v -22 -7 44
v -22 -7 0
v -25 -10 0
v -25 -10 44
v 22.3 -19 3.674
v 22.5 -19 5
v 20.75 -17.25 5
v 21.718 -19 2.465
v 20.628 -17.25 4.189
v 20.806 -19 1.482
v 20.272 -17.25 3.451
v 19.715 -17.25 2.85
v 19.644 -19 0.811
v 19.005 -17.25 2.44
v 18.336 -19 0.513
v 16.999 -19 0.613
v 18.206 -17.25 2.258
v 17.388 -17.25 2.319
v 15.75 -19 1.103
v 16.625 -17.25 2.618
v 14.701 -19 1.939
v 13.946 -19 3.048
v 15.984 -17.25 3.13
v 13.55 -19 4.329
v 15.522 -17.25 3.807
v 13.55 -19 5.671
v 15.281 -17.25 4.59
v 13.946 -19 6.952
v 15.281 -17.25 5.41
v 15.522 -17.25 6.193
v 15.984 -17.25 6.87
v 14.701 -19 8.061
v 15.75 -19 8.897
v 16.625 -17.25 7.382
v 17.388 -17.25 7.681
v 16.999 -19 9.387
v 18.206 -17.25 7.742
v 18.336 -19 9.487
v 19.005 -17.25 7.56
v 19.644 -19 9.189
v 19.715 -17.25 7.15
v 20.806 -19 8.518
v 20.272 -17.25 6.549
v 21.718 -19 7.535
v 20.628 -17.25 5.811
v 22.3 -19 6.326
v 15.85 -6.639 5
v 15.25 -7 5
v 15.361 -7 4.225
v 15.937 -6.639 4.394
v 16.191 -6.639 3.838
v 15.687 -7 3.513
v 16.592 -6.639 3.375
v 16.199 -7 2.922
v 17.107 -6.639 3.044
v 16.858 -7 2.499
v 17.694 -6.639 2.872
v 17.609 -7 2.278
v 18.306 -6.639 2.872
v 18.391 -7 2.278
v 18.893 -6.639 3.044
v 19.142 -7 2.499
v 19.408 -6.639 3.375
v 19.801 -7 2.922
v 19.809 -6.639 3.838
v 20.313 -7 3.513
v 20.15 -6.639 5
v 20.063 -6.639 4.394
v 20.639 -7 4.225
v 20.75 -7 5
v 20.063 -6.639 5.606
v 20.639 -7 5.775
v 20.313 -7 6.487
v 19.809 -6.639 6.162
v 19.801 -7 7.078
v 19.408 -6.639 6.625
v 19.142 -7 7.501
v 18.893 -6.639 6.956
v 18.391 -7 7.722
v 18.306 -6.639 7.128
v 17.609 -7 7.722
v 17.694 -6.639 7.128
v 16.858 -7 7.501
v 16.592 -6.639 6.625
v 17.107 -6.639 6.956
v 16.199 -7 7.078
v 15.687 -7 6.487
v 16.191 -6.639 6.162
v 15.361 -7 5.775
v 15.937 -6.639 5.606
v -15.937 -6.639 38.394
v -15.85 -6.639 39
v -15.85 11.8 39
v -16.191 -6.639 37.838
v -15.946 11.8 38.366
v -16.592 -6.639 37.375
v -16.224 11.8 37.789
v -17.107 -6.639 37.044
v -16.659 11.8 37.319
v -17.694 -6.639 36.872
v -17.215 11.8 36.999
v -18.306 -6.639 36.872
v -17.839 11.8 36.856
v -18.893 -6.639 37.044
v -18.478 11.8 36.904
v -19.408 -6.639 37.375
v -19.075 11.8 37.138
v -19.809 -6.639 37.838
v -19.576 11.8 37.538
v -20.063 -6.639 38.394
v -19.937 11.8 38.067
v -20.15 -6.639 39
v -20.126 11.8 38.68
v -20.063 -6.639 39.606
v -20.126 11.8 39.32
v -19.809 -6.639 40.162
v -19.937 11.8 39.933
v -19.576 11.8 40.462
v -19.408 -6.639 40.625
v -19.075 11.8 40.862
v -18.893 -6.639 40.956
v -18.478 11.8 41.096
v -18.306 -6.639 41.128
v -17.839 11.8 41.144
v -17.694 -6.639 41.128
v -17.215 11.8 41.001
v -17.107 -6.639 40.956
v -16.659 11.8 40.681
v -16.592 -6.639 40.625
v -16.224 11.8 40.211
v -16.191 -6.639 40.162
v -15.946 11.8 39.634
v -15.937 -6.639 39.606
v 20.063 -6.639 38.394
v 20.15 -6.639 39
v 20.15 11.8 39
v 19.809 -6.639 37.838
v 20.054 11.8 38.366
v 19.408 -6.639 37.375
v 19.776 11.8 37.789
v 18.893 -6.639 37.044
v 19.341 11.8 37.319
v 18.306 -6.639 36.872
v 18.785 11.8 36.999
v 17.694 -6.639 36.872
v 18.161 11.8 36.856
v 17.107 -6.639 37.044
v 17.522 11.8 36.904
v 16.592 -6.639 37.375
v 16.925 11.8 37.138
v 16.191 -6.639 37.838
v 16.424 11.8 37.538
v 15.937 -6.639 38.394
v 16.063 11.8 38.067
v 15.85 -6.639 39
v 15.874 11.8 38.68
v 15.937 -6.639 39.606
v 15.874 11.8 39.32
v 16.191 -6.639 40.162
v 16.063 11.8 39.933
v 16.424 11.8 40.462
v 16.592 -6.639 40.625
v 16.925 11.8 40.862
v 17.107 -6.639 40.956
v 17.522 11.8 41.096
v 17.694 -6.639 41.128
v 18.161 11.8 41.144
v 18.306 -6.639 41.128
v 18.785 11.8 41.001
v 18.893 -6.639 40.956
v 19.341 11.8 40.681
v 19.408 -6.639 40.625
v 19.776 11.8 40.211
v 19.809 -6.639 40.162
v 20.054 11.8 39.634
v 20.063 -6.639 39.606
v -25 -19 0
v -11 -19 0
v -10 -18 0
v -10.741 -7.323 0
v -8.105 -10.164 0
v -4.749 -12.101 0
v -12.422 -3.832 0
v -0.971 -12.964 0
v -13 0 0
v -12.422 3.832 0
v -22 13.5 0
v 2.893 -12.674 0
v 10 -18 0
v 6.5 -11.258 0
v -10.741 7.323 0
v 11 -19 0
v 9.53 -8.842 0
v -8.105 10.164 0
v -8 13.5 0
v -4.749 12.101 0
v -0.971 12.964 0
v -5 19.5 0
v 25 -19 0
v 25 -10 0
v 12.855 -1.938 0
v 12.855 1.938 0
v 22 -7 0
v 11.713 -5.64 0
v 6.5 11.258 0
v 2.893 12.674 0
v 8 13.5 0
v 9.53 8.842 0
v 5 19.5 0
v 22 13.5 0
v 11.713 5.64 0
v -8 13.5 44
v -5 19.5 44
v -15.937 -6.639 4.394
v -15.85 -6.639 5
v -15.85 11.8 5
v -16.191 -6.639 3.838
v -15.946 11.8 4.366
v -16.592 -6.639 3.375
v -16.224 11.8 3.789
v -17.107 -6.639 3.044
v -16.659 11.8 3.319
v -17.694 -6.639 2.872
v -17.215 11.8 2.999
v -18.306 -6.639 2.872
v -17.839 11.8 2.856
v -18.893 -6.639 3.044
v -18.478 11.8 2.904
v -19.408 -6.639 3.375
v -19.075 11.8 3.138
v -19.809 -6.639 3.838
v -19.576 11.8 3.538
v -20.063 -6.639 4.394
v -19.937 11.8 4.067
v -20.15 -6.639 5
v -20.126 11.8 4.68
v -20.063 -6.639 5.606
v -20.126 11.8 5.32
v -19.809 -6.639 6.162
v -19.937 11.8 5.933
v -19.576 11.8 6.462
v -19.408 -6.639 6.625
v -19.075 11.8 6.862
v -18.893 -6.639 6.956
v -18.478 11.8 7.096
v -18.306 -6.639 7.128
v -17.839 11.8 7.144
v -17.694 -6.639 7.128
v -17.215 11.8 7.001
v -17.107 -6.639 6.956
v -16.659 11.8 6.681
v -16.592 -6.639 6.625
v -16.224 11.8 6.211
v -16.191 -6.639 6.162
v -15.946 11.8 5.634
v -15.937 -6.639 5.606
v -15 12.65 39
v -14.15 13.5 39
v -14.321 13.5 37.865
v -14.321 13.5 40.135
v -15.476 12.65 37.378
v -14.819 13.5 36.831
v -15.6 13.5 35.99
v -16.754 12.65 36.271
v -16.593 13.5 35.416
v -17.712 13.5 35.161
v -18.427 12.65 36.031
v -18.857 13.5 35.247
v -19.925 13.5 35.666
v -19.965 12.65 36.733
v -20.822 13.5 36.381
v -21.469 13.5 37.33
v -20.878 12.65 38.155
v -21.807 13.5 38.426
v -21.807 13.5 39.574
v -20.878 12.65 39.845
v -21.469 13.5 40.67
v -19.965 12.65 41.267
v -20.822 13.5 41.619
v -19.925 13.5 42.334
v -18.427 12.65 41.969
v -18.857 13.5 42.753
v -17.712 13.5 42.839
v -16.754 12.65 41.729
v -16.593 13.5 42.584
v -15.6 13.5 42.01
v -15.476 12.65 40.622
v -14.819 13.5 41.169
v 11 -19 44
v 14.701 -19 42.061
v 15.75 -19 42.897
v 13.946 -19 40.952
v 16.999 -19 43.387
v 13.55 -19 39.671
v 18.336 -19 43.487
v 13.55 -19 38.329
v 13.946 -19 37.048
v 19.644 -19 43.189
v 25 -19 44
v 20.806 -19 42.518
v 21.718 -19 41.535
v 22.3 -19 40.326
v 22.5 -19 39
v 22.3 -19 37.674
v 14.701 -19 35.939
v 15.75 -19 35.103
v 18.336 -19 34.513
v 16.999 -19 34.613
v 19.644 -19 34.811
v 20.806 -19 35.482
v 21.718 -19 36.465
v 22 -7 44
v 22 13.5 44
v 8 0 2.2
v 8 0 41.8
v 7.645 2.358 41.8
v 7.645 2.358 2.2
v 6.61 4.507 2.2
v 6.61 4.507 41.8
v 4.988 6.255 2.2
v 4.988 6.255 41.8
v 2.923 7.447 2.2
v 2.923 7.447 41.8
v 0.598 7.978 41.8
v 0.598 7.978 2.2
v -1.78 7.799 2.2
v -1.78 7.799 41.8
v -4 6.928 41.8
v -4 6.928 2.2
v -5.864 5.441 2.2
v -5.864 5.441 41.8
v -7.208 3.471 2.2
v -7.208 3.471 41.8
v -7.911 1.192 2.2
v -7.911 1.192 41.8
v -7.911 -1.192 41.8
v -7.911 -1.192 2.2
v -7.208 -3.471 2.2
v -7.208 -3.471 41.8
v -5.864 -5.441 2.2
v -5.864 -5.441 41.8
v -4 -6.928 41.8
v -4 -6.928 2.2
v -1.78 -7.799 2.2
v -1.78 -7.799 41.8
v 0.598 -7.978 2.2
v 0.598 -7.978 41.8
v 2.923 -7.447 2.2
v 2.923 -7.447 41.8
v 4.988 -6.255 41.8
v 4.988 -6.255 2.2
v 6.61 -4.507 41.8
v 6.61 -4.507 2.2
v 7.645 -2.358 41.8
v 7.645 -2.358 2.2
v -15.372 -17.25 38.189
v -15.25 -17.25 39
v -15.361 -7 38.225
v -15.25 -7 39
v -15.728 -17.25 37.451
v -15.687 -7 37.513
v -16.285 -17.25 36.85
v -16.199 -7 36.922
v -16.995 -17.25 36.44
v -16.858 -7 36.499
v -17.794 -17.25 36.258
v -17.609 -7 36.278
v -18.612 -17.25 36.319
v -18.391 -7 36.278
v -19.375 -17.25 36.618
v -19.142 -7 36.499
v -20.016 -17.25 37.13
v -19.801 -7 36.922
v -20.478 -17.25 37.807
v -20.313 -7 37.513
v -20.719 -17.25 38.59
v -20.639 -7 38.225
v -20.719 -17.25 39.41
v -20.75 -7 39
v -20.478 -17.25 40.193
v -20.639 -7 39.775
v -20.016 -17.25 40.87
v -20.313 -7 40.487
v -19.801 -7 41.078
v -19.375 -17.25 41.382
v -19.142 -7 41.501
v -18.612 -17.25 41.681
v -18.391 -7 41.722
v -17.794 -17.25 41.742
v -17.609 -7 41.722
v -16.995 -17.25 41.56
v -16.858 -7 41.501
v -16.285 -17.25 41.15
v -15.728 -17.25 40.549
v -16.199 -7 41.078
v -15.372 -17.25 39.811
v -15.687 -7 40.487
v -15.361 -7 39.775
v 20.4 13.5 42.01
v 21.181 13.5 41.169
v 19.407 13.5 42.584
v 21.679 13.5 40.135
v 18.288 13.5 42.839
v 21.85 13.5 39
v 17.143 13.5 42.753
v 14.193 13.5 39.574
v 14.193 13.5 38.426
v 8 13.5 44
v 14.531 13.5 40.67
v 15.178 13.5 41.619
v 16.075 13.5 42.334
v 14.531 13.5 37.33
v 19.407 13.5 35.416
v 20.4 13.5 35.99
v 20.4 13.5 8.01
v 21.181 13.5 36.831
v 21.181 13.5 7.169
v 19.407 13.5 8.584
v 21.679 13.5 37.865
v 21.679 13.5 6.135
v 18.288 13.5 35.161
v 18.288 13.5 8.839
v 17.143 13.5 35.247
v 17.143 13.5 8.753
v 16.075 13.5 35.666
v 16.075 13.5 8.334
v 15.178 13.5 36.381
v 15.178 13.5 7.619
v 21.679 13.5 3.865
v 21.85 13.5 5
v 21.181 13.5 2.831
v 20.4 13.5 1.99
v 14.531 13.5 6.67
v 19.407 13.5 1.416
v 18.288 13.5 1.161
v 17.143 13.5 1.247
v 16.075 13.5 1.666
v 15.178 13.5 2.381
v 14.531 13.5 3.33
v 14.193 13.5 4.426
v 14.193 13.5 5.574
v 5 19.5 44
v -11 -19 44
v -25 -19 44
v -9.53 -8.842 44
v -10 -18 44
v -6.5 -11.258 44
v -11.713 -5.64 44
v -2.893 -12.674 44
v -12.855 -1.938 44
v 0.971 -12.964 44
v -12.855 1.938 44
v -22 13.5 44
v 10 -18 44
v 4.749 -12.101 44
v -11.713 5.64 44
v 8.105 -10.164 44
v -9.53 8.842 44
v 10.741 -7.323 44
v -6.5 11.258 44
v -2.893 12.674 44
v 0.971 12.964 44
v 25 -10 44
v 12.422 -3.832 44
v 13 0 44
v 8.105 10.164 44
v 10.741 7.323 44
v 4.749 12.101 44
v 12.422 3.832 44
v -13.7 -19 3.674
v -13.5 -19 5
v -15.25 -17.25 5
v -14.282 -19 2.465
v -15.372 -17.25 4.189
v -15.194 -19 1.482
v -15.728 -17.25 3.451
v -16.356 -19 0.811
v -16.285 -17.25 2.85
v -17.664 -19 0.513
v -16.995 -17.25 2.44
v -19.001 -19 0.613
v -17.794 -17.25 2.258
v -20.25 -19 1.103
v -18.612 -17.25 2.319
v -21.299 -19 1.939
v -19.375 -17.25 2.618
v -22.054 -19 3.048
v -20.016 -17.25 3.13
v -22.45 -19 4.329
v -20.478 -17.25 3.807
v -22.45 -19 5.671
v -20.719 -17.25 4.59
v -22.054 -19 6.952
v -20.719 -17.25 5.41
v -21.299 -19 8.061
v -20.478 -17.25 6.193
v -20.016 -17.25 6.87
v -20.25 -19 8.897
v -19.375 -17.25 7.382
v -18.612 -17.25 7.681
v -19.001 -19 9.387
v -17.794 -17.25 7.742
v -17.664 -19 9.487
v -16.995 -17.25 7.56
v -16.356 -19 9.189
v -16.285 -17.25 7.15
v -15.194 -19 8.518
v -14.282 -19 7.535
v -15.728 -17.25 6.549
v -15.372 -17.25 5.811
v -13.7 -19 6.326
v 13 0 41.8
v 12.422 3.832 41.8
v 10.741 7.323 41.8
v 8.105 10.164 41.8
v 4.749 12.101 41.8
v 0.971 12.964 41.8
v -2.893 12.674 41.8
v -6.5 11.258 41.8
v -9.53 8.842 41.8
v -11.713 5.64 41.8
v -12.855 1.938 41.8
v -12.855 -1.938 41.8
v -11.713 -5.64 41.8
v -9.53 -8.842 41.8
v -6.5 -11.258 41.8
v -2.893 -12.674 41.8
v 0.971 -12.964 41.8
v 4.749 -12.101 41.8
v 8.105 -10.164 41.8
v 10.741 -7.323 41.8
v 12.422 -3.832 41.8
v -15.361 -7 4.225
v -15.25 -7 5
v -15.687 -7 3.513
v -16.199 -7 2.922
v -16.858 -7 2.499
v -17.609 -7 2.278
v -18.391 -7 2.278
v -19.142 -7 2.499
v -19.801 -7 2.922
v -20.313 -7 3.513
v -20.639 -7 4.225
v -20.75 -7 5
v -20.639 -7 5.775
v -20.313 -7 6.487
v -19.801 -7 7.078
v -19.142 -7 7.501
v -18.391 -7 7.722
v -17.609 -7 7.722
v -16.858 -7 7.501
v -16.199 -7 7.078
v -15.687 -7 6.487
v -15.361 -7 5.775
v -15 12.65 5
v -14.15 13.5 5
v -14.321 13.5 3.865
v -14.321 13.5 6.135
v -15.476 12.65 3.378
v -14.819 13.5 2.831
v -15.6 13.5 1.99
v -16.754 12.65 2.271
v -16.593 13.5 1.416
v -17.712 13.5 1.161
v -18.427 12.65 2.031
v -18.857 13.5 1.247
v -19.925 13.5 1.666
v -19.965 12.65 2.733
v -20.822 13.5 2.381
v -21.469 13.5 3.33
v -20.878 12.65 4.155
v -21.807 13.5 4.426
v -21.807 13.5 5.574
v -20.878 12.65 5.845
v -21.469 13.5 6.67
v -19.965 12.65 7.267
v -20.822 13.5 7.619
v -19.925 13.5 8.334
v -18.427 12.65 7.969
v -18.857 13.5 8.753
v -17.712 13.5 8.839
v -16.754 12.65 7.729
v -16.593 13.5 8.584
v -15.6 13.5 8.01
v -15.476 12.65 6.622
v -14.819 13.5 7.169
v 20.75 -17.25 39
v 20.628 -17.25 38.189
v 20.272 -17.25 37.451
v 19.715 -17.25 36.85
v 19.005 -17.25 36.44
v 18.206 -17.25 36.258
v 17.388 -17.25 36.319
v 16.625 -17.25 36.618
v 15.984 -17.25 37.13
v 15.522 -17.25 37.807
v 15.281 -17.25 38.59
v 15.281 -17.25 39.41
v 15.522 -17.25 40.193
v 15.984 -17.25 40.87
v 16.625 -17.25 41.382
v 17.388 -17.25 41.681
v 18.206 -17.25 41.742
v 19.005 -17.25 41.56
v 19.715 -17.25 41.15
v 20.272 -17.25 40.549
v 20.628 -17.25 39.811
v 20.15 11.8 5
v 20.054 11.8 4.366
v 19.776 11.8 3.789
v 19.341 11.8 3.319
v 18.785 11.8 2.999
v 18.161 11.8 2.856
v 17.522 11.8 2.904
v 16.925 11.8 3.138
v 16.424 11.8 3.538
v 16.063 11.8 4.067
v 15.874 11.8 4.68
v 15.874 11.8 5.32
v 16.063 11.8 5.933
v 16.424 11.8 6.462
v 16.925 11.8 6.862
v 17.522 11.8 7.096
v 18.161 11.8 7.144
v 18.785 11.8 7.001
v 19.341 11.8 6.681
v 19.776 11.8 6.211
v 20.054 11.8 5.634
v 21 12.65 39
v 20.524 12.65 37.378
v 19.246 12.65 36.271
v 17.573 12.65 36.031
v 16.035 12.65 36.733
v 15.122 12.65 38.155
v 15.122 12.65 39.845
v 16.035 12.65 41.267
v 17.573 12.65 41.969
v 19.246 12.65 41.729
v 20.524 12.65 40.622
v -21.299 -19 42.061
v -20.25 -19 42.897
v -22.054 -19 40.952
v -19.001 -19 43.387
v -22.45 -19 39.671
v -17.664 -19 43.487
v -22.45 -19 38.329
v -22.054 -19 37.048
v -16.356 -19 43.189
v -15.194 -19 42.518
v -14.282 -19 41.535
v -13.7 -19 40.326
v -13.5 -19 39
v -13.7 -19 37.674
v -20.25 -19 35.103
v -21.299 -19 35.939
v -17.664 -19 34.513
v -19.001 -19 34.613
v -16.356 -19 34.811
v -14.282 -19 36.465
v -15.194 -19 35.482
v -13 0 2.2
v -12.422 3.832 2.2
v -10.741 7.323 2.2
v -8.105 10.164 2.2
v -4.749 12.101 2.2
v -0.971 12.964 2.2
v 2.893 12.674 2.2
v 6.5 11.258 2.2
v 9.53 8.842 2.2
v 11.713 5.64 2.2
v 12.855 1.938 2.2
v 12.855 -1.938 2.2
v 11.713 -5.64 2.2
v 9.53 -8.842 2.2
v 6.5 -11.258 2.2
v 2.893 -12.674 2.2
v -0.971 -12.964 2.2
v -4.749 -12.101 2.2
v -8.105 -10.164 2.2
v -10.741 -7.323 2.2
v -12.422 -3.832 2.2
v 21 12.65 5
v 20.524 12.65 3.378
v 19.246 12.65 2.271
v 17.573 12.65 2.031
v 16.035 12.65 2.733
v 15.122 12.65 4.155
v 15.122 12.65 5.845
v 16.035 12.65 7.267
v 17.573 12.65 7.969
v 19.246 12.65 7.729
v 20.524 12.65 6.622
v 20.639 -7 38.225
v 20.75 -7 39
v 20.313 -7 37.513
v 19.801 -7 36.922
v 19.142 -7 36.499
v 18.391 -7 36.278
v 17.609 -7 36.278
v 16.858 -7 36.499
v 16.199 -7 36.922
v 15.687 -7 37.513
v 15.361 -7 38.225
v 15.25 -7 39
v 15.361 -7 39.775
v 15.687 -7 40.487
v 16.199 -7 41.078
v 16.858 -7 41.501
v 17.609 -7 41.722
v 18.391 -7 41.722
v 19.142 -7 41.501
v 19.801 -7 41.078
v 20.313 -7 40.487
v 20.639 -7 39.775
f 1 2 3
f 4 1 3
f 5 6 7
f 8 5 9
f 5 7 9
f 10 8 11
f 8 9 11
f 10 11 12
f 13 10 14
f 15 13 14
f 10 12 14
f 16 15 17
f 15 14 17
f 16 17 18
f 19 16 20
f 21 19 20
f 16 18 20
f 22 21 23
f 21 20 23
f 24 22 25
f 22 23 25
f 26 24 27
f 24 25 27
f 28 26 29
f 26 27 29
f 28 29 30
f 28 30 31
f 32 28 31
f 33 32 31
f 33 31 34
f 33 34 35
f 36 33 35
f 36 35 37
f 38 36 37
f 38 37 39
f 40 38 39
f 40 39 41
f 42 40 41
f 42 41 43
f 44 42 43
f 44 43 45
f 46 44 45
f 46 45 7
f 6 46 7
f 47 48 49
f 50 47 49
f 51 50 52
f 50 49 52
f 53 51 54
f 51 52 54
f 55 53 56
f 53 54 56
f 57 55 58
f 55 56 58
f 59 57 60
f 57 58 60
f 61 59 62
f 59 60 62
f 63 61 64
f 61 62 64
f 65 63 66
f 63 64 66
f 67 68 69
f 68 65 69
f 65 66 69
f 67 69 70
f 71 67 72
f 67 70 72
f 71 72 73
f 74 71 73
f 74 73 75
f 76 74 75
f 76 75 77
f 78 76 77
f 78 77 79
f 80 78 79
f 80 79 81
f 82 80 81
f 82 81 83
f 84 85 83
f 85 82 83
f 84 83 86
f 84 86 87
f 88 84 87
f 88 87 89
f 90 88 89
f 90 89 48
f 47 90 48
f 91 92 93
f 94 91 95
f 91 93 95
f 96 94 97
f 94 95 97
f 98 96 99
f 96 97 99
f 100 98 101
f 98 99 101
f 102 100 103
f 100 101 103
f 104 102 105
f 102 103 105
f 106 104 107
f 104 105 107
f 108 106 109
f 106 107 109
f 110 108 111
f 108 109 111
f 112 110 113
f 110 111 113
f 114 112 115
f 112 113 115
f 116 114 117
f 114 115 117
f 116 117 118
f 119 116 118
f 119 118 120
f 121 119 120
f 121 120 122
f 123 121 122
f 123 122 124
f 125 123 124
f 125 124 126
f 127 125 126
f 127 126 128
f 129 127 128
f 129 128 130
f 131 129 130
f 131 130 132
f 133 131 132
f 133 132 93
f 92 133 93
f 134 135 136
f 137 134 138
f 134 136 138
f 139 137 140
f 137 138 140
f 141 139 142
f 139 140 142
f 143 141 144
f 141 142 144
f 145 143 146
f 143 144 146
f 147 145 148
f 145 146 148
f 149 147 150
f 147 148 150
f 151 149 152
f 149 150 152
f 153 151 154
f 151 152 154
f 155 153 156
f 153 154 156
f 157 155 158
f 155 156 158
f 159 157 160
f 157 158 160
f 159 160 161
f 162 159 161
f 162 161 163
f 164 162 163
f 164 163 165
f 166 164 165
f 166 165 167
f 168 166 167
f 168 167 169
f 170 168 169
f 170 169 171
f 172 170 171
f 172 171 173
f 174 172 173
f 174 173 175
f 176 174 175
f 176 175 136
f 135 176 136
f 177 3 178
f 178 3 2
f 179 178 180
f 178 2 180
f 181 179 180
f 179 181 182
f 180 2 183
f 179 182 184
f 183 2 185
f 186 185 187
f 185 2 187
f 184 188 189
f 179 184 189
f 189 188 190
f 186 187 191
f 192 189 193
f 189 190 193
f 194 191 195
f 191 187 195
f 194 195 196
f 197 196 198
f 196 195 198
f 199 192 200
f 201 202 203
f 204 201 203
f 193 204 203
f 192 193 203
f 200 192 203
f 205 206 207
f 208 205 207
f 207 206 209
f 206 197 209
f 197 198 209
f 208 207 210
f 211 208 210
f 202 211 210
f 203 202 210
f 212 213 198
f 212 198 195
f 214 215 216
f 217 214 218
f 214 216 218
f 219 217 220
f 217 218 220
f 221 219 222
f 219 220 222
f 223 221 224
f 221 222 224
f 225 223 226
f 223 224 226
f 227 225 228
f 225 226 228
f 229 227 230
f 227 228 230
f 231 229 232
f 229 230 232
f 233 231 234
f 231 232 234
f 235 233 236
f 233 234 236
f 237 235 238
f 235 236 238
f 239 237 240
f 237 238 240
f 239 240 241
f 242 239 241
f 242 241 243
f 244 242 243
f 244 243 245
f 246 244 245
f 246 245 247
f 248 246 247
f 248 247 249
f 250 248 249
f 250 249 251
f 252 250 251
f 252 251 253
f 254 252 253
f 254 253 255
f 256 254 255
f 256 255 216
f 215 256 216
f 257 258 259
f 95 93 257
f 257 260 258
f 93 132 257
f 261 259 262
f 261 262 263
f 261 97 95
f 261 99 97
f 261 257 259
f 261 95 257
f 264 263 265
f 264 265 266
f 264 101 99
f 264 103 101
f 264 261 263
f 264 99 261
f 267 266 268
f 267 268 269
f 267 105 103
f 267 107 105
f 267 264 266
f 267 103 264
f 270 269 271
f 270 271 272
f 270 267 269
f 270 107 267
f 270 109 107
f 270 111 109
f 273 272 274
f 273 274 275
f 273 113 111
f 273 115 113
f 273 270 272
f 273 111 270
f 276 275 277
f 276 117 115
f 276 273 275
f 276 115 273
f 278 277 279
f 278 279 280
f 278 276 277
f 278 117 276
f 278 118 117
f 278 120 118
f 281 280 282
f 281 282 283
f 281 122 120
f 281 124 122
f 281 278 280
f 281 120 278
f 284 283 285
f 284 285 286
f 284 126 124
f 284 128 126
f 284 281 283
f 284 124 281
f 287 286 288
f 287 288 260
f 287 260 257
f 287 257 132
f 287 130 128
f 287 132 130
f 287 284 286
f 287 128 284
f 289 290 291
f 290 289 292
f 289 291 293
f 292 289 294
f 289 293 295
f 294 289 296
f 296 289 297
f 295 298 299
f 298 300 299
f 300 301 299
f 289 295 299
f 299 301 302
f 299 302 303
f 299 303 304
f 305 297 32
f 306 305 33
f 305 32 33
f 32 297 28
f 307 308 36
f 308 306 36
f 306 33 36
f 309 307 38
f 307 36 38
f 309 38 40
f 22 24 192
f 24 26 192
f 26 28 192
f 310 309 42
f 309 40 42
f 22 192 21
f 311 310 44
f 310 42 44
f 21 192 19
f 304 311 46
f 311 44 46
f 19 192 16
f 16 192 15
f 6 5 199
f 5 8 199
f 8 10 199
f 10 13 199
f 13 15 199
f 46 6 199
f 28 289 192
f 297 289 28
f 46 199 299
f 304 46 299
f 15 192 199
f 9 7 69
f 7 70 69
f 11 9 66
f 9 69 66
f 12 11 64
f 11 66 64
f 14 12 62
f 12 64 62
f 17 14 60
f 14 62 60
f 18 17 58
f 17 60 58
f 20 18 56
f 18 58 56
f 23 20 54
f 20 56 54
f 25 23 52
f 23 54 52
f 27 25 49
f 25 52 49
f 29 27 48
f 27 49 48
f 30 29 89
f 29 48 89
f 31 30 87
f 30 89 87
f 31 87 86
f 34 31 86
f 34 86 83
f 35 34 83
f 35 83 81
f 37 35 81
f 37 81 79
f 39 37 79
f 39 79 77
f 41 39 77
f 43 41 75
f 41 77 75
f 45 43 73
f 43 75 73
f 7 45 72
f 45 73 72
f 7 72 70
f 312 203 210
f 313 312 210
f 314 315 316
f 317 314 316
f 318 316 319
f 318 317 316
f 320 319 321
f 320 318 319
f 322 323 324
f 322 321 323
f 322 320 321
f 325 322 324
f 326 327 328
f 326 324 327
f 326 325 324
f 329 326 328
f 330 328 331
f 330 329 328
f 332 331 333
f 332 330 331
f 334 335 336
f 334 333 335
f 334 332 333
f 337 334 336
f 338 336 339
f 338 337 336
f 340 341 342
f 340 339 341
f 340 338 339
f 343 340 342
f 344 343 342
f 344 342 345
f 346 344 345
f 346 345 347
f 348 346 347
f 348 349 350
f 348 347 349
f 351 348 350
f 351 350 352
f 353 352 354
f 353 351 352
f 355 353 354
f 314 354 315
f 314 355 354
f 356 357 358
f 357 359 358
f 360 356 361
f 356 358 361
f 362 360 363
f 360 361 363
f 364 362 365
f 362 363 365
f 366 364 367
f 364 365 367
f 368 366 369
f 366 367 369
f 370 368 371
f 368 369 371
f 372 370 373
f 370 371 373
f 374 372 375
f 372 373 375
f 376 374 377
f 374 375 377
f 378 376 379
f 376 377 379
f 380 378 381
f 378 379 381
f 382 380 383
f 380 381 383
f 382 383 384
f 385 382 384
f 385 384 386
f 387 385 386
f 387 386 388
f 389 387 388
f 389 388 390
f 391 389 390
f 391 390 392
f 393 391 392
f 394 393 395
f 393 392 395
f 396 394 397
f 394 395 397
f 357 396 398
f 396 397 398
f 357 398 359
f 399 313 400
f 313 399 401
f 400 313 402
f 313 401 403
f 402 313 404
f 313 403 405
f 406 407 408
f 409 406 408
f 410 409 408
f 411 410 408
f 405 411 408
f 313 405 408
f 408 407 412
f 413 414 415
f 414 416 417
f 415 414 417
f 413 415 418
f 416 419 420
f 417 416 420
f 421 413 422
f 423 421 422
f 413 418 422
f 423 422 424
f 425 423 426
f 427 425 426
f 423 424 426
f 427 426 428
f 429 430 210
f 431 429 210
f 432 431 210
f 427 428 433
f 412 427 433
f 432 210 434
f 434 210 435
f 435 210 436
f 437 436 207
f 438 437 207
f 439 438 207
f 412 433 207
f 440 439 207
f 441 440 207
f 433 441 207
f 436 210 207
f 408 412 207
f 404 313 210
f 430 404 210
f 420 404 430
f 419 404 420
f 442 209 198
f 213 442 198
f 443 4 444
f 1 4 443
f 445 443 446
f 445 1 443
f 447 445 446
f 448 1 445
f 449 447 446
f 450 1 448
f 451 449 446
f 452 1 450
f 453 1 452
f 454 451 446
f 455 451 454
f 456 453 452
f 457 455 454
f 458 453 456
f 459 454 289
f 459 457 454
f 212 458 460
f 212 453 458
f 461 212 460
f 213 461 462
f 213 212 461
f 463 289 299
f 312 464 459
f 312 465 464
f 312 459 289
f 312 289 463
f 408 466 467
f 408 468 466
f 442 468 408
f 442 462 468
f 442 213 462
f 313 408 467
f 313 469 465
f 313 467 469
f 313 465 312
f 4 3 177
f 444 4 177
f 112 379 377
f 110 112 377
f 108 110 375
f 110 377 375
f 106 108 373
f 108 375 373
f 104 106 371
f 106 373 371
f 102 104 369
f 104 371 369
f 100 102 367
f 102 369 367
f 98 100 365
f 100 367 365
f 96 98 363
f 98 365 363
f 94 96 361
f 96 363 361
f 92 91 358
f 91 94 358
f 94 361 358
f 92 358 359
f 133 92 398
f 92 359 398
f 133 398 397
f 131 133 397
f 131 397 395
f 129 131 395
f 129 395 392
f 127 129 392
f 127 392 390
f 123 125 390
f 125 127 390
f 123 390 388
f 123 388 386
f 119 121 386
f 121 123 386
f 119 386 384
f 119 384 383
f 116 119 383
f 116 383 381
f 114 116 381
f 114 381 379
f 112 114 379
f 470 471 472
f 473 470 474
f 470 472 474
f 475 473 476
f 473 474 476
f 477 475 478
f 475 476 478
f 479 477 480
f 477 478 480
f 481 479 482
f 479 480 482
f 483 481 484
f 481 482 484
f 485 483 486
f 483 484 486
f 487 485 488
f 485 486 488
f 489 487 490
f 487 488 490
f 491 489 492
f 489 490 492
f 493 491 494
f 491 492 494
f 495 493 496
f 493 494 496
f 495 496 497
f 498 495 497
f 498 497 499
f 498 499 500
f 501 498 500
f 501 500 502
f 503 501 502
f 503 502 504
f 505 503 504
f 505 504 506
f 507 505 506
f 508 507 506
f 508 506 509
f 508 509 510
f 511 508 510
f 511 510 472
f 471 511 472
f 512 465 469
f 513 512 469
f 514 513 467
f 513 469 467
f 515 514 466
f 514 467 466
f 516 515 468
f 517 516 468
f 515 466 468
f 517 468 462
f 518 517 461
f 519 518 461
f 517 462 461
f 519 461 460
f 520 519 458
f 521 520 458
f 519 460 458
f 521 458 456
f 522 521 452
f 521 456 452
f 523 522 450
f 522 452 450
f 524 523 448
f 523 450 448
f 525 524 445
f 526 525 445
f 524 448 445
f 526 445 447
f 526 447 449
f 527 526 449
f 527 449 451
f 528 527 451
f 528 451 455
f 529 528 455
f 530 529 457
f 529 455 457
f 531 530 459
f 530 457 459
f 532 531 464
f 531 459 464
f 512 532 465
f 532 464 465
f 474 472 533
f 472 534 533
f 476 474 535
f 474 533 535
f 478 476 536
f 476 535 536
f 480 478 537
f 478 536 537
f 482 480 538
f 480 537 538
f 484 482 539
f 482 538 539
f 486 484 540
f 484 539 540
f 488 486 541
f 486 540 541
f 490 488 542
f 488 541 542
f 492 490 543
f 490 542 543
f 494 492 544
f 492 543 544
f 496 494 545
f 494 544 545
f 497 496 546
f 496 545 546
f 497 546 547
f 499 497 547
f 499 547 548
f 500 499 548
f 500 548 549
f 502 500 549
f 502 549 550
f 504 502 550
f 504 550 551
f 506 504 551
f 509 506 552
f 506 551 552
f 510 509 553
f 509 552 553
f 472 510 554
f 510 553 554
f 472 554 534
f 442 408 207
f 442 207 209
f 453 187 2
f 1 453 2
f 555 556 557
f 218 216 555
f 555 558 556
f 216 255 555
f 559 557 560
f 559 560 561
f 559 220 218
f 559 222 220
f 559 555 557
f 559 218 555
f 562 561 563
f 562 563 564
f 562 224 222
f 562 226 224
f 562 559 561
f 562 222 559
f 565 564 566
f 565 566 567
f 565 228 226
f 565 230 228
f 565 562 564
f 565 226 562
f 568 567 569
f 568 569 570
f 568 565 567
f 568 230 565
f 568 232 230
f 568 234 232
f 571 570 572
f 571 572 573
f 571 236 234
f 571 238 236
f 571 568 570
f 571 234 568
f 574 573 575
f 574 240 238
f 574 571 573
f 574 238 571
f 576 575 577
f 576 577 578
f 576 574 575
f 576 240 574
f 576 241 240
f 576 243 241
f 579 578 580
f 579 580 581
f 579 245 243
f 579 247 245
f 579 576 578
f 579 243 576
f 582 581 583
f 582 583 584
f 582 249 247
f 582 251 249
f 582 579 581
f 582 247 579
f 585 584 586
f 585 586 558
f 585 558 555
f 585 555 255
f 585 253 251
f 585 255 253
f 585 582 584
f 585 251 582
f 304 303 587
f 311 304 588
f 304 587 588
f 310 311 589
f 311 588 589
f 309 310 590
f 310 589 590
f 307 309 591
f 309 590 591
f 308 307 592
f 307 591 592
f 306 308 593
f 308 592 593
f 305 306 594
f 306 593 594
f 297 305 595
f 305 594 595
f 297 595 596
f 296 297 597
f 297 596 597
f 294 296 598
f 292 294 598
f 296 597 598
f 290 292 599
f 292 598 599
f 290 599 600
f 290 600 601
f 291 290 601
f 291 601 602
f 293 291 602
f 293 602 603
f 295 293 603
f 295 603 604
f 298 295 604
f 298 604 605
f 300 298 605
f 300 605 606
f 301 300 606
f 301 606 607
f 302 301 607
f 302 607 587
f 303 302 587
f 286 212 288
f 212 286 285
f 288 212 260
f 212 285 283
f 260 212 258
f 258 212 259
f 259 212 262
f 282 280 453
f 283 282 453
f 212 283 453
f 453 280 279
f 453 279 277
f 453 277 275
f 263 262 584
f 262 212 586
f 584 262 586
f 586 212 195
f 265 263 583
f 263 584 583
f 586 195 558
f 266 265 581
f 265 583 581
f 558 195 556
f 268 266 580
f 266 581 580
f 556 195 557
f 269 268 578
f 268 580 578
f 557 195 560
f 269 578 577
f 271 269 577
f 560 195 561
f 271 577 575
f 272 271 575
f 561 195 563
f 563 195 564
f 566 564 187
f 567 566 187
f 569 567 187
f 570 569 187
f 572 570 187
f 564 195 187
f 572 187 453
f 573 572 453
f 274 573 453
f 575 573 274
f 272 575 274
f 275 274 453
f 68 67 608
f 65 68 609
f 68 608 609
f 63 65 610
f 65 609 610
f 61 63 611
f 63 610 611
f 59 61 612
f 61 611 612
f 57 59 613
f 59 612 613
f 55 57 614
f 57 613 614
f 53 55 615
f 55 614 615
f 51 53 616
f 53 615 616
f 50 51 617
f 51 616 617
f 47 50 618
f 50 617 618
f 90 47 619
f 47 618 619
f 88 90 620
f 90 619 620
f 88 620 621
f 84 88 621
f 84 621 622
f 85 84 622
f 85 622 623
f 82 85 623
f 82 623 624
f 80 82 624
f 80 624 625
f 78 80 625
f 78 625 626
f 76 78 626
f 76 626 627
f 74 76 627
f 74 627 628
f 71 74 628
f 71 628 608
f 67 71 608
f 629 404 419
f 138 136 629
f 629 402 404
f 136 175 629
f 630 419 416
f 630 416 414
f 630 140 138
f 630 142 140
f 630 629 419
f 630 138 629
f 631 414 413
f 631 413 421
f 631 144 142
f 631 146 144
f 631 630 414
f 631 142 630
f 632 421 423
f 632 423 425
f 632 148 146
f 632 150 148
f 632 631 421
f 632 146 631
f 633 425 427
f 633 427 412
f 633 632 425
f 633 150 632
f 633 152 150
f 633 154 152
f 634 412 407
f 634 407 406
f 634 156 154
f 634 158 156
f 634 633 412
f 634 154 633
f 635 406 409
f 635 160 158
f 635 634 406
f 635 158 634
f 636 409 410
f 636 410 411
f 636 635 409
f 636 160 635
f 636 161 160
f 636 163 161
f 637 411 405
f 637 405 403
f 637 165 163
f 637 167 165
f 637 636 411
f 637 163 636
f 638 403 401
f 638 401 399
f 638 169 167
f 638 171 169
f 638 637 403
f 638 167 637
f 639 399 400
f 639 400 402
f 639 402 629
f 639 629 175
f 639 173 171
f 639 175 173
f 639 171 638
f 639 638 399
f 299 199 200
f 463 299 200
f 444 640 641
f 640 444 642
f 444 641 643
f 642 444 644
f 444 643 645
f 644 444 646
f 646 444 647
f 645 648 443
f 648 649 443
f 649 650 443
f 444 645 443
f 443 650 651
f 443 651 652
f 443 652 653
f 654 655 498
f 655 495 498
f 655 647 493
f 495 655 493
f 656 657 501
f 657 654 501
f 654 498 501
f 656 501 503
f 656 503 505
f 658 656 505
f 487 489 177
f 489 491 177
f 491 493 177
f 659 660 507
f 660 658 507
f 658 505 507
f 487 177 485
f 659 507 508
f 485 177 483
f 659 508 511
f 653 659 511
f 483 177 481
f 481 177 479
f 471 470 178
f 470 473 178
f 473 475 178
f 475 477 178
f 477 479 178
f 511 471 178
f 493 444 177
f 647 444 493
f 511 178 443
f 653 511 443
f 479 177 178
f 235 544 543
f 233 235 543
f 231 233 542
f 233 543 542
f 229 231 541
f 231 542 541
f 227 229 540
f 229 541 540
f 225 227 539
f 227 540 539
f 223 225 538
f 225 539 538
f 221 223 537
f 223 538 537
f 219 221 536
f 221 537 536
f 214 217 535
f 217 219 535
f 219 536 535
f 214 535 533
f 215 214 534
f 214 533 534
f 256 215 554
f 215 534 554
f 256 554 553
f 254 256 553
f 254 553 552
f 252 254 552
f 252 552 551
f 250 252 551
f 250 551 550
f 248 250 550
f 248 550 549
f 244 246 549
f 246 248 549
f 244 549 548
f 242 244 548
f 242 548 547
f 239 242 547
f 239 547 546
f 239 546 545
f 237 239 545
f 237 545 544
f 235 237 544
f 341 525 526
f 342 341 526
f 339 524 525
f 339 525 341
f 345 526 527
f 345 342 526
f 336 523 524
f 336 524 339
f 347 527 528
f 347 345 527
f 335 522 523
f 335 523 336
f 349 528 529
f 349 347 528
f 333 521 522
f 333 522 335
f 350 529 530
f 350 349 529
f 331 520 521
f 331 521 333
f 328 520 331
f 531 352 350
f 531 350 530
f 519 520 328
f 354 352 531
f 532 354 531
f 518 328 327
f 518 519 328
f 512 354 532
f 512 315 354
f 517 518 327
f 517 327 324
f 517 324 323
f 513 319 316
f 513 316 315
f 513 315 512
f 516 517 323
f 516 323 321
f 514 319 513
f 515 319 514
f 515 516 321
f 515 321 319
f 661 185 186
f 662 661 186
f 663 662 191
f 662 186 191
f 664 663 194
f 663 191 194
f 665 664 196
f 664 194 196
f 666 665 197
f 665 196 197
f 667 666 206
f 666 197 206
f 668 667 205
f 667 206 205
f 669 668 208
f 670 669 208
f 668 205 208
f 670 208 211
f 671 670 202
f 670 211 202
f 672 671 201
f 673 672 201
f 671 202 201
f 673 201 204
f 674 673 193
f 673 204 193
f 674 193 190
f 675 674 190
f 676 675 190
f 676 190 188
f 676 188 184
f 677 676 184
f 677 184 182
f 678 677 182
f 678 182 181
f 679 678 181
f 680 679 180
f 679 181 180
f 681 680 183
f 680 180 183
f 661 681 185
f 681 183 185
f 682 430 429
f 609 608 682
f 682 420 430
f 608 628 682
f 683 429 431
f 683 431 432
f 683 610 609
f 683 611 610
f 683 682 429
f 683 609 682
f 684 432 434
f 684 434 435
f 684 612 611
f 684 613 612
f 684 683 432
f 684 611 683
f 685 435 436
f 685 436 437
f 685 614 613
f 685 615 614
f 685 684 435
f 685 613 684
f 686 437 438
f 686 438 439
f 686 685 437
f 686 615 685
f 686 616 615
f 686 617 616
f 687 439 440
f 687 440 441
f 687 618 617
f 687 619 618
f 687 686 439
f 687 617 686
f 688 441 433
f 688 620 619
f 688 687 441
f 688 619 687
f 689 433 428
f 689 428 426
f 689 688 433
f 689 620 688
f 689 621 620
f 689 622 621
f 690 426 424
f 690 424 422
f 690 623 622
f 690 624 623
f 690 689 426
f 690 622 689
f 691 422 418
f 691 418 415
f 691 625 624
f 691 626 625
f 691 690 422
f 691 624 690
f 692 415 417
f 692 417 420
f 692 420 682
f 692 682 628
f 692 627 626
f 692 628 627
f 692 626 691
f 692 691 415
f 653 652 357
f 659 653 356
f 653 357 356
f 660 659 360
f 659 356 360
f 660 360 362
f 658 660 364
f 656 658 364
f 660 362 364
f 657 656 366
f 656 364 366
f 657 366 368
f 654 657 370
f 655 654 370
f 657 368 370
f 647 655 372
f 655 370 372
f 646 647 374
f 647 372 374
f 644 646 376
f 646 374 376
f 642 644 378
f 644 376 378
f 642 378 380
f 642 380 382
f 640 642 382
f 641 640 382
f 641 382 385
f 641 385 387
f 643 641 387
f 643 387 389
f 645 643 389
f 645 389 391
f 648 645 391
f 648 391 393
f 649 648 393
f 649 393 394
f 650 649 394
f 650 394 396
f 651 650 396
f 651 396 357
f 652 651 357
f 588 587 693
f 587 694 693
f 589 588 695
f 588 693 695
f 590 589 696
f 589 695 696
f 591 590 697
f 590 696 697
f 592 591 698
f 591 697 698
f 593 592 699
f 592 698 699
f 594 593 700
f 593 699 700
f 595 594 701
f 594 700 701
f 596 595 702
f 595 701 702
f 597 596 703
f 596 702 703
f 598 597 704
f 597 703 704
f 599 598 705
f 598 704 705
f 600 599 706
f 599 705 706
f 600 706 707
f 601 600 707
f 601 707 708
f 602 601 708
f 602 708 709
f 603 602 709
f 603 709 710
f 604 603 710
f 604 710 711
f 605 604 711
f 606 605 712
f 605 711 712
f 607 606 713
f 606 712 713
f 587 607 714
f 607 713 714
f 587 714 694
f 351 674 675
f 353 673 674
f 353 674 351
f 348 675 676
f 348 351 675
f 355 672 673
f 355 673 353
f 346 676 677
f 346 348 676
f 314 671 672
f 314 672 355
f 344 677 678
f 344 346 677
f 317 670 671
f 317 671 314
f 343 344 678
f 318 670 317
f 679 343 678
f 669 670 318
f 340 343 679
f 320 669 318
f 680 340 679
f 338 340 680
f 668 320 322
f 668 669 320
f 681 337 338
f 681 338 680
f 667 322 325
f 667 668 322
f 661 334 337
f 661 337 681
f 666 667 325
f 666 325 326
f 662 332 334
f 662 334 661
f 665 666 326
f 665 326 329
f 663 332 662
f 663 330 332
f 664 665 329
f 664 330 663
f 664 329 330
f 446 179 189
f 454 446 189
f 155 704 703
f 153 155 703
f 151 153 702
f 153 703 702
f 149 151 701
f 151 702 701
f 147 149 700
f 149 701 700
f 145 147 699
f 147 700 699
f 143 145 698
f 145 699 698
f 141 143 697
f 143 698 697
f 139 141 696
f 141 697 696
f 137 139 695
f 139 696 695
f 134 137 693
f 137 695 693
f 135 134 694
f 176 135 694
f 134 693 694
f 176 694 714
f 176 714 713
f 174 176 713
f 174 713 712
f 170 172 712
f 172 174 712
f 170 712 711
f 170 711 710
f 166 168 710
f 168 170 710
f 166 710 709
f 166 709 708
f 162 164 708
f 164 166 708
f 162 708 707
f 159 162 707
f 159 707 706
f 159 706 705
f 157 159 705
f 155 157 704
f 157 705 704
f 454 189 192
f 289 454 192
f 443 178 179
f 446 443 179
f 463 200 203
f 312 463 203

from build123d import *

# Parameters (mm, degrees)
ESBO_O1_R                                            = 8
EXTRUS_O1_DEPTH                                      = 44
ESBO_O2_R                                            = 13
EXTRUS_O2_DEPTH                                      = 2.2
ESBO_O3_R                                            = 13
EXTRUS_O3_DEPTH                                      = 2.2
ESBO_O4_R                                            = 2.15
EXTRUS_O4_DEPTH                                      = 33.5
ESCAREADO_PARA_PARAFUSO_DE_M_QUINA_COM_C_D           = 5.5
ESCAREADO_PARA_PARAFUSO_DE_M_QUINA_COM_C_DEPTH       = 12
ESCAREADO_PARA_PARAFUSO_DE_M_QUINA_COM_C_CSINK_D     = 9
ESCAREADO_PARA_PARAFUSO_DE_M_QUINA_COM_C_CSINK_ANGLE = 90
ESCAREADO_PARA_PARAFUSO_DE_M_QUINA_COM_C_TIP         = 1.652366702
CHANFRO1_SIZE                                        = 1.7


with BuildPart() as part:
    # Esboço1 → Extrusão1 (new body)
    with BuildSketch(Plane.XY):
        Polygon((-22, 13.5), (-22, -7), (-25, -10), (-25, -19), (-11, -19), (-10, -18), (10, -18), (11, -19), (25, -19), (25, -10), (22, -7), (22, 13.5), (8, 13.5), (5, 19.5), (-5, 19.5), (-8, 13.5), align=None)
        Circle(ESBO_O1_R, mode=Mode.SUBTRACT)
    extrude(amount=EXTRUS_O1_DEPTH)

    # Esboço2 → Extrusão2 (cut)
    with BuildSketch(Plane.XY.offset(44)):
        Circle(ESBO_O2_R)
    extrude(amount=-EXTRUS_O2_DEPTH, mode=Mode.SUBTRACT)

    # Esboço3 → Extrusão3 (cut)
    with BuildSketch(Plane(origin=(0, 0, 0), x_dir=(-1, 0, 0), z_dir=(0, 0, -1))):
        Circle(ESBO_O3_R)
    extrude(amount=-EXTRUS_O3_DEPTH, mode=Mode.SUBTRACT)

    # Esboço4 → Extrusão4 (cut, through all)
    with BuildSketch(Plane(origin=(0, 13.5, 0), x_dir=(1, 0, 0), z_dir=(0, 1, 0))):
        with Locations((18, -5)):
            Circle(ESBO_O4_R)
        with Locations((18, -39)):
            Circle(ESBO_O4_R)
        with Locations((-18, -5)):
            Circle(ESBO_O4_R)
        with Locations((-18, -39)):
            Circle(ESBO_O4_R)
    extrude(amount=-EXTRUS_O4_DEPTH, mode=Mode.SUBTRACT)

    # Escareado para parafuso de máquina com cabeça chata de M52
    with Locations(Plane(origin=(-18, -19, 39), x_dir=(-1, 0, 0), z_dir=(0, -1, 0))):
        with Locations((0, 0), (0, 34), (-36, 34), (-36, 0)):
            CounterSinkHole(ESCAREADO_PARA_PARAFUSO_DE_M_QUINA_COM_C_D / 2, ESCAREADO_PARA_PARAFUSO_DE_M_QUINA_COM_C_CSINK_D / 2, depth=ESCAREADO_PARA_PARAFUSO_DE_M_QUINA_COM_C_DEPTH, counter_sink_angle=ESCAREADO_PARA_PARAFUSO_DE_M_QUINA_COM_C_CSINK_ANGLE)
            with Locations((0, 0, -(ESCAREADO_PARA_PARAFUSO_DE_M_QUINA_COM_C_DEPTH + ESCAREADO_PARA_PARAFUSO_DE_M_QUINA_COM_C_TIP / 2))):  # 118° drill point
                Cone(0, ESCAREADO_PARA_PARAFUSO_DE_M_QUINA_COM_C_D / 2, ESCAREADO_PARA_PARAFUSO_DE_M_QUINA_COM_C_TIP, mode=Mode.SUBTRACT)

    # Chanfro1
    chanfro1_edges = [part.edges().sort_by_distance(p)[0] for p in [
        (15.85, 13.5, 5),
        (15.85, 13.5, 39),
        (-20.15, 13.5, 5),
        (-20.15, 13.5, 39),
    ]]
    chamfer(chanfro1_edges, length=CHANFRO1_SIZE)


solid = part.part
